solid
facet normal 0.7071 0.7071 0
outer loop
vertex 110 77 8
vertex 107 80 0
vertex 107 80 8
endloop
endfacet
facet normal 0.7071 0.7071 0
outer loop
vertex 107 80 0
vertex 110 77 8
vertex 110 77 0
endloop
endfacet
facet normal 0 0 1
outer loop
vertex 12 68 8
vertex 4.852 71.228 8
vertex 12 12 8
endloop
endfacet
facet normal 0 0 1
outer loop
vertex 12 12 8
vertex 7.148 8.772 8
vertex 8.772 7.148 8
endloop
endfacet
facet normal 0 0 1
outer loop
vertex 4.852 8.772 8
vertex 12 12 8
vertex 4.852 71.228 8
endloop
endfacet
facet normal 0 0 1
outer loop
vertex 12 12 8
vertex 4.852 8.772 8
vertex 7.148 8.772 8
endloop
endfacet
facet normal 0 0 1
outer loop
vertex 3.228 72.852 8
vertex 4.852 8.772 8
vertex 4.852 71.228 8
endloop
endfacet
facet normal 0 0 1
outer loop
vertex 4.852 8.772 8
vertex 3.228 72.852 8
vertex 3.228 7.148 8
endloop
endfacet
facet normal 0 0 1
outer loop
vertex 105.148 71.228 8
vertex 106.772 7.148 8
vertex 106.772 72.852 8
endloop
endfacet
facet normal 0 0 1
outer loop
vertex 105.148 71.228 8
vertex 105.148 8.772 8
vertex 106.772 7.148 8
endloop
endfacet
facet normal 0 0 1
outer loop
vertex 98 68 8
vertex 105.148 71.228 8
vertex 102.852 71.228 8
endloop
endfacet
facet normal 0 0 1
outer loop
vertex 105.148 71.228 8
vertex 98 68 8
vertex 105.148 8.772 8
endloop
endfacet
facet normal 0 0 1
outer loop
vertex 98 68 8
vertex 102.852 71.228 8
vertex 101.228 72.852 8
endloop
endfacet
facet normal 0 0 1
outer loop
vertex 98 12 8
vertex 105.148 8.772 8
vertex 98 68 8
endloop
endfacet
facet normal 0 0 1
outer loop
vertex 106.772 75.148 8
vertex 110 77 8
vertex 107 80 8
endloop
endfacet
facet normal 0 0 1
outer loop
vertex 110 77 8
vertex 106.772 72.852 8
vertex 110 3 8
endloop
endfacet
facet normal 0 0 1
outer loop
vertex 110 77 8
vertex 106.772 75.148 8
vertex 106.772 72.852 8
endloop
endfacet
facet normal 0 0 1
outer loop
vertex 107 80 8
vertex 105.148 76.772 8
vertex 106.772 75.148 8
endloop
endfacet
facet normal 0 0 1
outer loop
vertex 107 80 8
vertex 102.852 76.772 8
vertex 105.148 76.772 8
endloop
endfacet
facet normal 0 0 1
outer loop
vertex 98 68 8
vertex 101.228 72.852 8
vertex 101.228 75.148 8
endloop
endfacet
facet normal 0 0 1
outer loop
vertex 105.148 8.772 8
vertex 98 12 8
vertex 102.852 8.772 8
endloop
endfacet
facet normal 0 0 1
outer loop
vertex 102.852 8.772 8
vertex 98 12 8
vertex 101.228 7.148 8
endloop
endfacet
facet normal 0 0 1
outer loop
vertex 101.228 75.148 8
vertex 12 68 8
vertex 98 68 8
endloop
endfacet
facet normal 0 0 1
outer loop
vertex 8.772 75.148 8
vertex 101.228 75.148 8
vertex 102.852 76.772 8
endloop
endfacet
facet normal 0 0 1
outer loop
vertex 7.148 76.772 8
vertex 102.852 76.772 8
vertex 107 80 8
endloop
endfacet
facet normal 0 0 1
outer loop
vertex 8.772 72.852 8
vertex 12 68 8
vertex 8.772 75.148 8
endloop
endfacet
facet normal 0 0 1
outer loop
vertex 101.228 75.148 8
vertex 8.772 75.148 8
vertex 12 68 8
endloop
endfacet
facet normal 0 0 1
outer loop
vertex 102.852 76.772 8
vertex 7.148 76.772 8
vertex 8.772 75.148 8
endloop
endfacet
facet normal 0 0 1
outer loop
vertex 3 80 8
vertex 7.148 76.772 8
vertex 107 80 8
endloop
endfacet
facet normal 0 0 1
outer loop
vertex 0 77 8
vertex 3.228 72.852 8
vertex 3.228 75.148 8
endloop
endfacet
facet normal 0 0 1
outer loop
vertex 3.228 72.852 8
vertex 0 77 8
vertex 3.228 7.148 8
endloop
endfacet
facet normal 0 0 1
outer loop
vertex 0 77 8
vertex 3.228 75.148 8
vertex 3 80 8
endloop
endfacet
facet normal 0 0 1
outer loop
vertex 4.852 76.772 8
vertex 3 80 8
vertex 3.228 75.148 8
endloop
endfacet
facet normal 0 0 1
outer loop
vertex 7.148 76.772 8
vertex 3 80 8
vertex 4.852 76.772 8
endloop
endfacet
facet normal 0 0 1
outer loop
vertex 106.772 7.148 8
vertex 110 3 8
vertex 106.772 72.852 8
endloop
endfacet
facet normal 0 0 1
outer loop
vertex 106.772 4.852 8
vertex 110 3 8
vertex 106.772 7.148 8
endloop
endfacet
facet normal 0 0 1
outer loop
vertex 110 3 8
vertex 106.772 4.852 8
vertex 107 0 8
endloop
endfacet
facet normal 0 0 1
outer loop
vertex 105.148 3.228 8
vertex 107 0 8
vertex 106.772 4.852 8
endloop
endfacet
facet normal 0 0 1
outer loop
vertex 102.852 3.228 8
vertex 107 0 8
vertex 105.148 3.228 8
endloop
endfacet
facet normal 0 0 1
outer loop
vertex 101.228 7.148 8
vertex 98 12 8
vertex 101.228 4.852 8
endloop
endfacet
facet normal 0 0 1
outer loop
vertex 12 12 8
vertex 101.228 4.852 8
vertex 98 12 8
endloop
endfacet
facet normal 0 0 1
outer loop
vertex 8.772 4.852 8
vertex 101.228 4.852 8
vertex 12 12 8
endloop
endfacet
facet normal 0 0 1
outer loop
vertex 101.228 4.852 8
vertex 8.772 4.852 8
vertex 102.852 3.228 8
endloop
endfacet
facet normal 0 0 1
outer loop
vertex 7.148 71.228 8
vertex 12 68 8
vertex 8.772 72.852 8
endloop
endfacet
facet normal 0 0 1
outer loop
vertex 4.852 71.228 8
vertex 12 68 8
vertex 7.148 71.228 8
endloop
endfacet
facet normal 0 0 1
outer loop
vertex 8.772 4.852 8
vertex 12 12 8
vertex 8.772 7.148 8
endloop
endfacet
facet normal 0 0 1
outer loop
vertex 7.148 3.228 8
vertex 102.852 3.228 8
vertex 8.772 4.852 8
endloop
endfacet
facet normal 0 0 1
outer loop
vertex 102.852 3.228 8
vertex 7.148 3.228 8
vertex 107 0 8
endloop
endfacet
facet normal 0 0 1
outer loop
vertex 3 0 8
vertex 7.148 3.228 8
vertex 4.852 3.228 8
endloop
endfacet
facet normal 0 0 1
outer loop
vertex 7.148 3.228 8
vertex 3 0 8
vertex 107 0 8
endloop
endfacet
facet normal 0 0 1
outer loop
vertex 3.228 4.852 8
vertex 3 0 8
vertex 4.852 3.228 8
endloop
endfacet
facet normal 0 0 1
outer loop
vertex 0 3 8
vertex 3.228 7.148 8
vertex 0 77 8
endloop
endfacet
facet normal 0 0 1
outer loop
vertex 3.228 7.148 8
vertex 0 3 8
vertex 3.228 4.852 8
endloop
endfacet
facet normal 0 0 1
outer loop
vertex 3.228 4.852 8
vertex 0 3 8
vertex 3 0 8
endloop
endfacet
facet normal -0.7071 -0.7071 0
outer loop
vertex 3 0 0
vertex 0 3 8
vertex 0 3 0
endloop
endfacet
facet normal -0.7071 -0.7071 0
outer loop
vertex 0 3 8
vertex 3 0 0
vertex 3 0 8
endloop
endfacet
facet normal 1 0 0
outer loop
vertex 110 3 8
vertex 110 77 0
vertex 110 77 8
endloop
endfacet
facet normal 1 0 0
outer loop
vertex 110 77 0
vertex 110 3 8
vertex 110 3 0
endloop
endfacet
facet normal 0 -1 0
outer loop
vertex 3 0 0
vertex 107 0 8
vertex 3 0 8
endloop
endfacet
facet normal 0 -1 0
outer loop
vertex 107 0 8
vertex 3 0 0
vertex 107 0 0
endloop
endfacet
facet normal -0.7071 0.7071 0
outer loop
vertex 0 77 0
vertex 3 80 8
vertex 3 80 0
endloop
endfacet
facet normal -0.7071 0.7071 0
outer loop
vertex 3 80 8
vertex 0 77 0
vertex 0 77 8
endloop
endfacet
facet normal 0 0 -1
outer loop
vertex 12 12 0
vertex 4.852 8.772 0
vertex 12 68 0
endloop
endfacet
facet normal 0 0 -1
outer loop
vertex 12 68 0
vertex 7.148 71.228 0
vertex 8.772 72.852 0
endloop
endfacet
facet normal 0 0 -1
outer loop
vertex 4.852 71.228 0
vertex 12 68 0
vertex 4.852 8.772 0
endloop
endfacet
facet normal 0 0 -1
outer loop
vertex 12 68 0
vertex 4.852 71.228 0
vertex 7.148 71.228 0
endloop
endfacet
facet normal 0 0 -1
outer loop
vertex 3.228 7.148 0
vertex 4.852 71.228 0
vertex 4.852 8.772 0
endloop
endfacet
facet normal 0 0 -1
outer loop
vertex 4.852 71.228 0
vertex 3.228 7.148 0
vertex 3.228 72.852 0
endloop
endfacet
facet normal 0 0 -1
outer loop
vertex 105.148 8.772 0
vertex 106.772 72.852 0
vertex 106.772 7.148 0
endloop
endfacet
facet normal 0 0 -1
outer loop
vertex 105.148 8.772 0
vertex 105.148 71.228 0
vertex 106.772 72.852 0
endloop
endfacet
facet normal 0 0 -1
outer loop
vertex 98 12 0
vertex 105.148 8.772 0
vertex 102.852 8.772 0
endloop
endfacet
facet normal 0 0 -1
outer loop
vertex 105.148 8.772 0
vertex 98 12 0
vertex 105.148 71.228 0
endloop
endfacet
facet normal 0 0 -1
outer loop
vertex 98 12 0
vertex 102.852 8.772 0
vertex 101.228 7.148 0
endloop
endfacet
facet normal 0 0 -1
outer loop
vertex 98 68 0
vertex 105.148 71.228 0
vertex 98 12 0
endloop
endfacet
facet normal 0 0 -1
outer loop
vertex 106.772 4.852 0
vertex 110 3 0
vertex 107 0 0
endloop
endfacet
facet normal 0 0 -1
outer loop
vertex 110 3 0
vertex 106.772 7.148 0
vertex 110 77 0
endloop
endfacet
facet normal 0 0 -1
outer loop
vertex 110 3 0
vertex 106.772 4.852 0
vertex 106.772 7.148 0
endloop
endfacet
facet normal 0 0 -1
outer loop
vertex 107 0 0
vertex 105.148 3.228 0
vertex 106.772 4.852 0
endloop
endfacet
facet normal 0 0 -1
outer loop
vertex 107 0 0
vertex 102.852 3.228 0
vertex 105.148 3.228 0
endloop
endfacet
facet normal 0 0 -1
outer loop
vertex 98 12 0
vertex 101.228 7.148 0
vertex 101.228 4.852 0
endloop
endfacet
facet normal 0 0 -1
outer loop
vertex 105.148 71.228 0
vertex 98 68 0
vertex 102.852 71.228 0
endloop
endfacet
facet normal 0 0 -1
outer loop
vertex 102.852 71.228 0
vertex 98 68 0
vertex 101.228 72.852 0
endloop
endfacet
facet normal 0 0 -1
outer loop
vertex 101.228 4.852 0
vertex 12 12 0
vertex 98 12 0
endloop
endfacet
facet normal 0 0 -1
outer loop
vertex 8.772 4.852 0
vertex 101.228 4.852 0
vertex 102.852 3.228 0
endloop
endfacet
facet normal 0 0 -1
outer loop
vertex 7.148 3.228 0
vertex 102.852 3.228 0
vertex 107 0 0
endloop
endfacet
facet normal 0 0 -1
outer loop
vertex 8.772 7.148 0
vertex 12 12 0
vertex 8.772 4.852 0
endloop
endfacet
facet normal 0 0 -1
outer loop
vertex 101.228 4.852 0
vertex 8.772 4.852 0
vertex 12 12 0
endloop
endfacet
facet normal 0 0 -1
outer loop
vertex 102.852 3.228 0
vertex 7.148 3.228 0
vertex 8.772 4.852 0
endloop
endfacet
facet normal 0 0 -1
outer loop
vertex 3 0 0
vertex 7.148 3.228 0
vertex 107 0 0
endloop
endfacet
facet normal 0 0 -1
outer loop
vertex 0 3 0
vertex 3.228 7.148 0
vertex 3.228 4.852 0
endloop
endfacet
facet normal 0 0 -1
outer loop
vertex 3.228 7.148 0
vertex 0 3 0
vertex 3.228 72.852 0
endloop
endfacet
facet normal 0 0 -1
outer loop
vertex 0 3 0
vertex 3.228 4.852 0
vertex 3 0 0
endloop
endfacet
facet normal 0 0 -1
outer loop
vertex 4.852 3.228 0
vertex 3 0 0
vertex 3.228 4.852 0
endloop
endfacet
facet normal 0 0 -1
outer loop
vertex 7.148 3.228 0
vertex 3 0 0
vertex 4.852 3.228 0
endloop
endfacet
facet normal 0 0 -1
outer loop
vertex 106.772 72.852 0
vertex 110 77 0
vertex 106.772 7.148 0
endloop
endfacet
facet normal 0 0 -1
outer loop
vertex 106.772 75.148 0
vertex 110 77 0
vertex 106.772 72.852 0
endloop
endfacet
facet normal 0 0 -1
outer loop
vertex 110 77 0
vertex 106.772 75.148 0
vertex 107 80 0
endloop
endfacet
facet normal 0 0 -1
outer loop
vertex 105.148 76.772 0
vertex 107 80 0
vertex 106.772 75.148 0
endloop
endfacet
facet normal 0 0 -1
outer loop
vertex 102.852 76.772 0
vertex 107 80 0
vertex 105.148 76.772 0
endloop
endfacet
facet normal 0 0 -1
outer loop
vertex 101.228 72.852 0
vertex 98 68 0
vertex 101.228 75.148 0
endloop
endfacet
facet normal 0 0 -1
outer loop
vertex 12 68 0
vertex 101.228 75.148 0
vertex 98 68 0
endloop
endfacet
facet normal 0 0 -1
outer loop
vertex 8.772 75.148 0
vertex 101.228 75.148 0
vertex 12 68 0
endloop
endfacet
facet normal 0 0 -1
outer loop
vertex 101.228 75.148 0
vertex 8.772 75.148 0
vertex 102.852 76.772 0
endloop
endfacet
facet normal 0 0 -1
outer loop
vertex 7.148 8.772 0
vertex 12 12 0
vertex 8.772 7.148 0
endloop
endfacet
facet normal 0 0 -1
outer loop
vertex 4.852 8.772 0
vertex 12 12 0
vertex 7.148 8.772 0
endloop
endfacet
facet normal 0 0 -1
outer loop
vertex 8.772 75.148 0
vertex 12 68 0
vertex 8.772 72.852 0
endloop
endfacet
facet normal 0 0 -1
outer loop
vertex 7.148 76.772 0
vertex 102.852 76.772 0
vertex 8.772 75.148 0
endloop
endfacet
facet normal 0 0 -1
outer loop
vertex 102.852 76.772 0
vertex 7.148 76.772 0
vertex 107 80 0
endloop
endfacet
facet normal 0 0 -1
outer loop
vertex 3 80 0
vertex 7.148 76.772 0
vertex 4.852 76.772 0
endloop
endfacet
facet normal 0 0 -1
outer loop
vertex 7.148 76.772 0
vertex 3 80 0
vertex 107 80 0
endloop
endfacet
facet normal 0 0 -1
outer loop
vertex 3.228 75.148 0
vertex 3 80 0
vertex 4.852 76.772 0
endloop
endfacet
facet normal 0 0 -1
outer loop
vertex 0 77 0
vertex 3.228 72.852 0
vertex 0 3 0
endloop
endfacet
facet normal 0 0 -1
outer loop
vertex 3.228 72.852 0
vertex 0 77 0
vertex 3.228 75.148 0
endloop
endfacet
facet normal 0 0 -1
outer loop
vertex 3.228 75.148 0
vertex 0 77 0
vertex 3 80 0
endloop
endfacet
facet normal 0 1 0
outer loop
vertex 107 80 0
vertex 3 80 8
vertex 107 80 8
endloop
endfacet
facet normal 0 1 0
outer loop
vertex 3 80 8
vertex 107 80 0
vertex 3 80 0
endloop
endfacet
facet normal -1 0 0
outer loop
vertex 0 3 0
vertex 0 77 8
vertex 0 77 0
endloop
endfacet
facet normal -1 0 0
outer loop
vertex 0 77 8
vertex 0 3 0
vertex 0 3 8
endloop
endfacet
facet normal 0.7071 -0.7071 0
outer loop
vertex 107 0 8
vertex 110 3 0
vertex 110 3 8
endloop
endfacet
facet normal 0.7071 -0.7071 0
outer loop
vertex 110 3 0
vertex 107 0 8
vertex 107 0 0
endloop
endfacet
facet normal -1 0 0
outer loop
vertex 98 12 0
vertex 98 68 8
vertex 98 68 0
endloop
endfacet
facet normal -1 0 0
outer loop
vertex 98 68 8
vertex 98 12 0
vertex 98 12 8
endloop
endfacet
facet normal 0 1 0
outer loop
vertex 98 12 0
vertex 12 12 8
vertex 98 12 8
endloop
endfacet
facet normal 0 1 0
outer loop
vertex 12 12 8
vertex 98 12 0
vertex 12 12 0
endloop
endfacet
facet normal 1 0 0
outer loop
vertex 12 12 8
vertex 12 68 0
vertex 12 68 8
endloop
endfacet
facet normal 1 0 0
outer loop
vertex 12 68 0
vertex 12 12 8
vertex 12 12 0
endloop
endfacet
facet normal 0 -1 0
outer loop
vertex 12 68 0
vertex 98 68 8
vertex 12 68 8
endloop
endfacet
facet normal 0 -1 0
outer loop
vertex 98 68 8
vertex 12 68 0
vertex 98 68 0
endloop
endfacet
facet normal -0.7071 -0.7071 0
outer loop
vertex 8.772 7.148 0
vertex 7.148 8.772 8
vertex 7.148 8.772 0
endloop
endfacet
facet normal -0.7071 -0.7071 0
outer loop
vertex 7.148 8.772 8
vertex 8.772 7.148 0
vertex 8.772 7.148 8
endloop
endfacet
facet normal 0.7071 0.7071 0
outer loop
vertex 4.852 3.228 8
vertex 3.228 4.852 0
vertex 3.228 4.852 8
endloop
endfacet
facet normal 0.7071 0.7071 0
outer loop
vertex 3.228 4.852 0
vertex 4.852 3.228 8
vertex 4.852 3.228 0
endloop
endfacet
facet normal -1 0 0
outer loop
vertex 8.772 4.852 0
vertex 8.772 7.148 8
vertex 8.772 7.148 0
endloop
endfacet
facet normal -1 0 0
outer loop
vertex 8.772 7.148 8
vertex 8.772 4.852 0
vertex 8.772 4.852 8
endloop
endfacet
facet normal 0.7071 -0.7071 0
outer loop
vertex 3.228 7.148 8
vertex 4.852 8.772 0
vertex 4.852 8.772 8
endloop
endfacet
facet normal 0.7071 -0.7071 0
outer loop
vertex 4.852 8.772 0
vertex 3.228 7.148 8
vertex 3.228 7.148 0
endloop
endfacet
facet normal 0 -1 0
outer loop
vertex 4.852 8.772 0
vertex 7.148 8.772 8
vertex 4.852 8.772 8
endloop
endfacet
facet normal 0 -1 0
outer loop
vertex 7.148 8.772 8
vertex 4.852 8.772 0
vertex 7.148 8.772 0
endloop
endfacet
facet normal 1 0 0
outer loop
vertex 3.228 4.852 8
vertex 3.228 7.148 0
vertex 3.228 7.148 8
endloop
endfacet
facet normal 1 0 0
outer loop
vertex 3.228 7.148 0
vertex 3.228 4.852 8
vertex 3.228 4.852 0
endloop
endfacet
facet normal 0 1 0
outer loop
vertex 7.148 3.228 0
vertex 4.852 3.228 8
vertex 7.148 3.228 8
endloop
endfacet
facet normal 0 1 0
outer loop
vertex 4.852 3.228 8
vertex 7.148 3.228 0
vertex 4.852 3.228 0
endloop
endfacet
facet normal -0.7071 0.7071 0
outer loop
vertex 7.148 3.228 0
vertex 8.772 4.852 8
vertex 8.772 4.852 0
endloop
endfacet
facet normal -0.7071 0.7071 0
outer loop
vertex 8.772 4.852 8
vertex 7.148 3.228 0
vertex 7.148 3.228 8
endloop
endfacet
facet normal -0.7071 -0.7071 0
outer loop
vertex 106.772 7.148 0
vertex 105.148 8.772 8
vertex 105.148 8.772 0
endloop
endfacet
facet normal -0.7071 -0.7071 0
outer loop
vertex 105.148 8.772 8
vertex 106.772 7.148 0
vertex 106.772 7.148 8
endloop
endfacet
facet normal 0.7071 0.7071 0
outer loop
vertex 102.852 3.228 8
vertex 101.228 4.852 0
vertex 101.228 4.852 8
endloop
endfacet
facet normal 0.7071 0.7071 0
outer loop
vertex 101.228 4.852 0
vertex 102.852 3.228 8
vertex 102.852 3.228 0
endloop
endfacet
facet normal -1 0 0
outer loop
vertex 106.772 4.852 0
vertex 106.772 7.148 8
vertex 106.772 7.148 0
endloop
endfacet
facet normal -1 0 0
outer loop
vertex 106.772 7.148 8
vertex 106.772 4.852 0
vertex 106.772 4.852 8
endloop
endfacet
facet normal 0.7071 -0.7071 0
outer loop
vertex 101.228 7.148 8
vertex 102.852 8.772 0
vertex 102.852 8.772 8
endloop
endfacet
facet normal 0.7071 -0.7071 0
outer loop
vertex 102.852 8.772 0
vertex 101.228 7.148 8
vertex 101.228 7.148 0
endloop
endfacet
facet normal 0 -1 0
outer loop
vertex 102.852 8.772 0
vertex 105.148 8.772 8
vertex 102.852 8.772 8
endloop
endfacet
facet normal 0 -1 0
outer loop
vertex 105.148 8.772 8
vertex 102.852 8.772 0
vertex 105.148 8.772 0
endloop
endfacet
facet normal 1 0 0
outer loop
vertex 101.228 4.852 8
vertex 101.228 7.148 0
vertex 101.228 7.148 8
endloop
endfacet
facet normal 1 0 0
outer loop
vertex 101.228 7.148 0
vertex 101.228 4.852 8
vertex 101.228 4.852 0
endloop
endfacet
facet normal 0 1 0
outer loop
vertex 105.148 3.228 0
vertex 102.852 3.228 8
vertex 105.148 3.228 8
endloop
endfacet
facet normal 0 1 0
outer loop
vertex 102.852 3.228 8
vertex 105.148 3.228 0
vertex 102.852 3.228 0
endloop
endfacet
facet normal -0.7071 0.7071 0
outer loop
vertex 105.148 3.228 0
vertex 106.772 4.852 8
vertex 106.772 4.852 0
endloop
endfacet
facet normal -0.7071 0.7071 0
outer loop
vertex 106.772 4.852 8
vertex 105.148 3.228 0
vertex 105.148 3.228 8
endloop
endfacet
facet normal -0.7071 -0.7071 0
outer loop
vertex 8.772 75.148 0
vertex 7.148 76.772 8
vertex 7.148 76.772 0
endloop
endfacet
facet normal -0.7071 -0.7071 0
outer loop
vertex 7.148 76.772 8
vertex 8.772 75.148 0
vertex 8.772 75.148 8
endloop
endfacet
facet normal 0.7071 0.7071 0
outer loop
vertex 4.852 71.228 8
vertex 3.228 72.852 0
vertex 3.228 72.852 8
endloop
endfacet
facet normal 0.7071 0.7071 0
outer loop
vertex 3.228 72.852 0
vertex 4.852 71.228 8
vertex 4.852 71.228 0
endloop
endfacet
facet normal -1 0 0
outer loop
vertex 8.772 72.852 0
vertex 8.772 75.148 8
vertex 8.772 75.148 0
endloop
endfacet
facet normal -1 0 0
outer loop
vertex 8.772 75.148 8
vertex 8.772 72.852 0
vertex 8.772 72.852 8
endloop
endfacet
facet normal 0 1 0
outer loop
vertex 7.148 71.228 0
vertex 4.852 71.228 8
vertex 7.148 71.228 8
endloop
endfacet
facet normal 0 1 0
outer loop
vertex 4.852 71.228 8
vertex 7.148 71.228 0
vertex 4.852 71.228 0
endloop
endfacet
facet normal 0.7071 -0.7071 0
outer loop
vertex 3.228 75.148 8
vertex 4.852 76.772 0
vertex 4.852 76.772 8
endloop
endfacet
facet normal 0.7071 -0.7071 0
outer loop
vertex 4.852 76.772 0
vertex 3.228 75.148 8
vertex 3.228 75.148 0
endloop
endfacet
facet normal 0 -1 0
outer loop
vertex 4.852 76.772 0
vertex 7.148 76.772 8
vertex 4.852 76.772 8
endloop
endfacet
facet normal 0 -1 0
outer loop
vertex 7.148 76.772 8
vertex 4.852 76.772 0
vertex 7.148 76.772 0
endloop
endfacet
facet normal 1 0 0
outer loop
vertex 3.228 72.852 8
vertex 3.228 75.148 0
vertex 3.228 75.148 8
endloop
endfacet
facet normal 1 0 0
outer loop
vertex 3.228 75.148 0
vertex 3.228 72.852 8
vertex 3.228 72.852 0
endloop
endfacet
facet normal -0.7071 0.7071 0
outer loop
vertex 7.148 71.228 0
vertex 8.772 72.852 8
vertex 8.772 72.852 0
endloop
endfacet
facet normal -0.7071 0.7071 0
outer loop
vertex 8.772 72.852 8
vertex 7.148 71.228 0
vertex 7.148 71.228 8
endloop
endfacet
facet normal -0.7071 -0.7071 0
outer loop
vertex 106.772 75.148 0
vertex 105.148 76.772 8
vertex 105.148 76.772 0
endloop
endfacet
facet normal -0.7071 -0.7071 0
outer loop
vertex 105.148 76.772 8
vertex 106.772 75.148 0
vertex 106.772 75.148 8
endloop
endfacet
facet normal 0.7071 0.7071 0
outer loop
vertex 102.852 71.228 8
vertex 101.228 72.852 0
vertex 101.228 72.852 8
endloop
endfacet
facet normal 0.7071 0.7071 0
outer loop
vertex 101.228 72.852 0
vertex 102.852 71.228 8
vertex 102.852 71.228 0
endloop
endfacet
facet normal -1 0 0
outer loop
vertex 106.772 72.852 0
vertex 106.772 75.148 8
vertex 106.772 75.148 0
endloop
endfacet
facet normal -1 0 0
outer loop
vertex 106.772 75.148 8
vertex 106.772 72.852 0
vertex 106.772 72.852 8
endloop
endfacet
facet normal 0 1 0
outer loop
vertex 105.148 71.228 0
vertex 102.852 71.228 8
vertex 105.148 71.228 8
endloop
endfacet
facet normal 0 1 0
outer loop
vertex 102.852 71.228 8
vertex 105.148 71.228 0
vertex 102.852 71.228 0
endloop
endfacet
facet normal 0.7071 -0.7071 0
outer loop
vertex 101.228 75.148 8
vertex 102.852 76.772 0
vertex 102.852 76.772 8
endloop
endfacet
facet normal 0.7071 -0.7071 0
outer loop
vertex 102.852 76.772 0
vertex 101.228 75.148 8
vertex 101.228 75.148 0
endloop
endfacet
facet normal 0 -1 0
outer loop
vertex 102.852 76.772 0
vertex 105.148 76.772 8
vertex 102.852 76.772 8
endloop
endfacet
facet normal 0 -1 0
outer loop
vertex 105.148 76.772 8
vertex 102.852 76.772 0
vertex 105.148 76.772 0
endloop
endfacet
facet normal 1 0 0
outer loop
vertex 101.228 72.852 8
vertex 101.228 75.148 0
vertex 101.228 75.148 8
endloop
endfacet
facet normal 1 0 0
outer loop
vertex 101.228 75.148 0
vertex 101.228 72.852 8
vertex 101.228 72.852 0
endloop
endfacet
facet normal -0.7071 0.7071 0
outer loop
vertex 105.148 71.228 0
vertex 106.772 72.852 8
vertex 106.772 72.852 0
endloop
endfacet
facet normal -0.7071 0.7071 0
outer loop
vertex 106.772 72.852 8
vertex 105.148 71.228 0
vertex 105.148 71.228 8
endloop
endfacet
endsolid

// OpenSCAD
$fn = 32;

// ----------------------------------------------------------------------
// Frame plate: 110 x 80 frame, 12 mm rails
// ----------------------------------------------------------------------

// --- parameters (mm) ---
plate_l = 110;            // plate length, X
plate_w = 80;             // plate width, Y
plate_t = 8;              // plate thickness, Z (extrusion height)
corner_c = 3;             // corner chamfer
frame_bar = 12;           // frame rail width
bolt_r = 3;               // corner bolt window radius
bolt_inset = 6;           // bolt centre inset from the edges

win_l = plate_l - 2 * frame_bar;  // window length
win_w = plate_w - 2 * frame_bar;  // window width
bolt_d = 2 * bolt_r;  // corner hole diameter

profile = [[3, 0], [107, 0], [110, 3], [110, 77], [107, 80], [3, 80], [0, 77], [0, 3]];  // primary outline, 8 points, counter clockwise
void_1 = [[12, 12], [98, 12], [98, 68], [12, 68]];  // the window, 4 points
void_2 = [[8.772, 7.148], [7.148, 8.772], [4.852, 8.772], [3.228, 7.148], [3.228, 4.852], [4.852, 3.228], [7.148, 3.228], [8.772, 4.852]];  // corner bolt window, 8 points
void_3 = [[106.772, 7.148], [105.148, 8.772], [102.852, 8.772], [101.228, 7.148], [101.228, 4.852], [102.852, 3.228], [105.148, 3.228], [106.772, 4.852]];  // corner bolt window, 8 points
void_4 = [[8.772, 75.148], [7.148, 76.772], [4.852, 76.772], [3.228, 75.148], [3.228, 72.852], [4.852, 71.228], [7.148, 71.228], [8.772, 72.852]];  // corner bolt window, 8 points
void_5 = [[106.772, 75.148], [105.148, 76.772], [102.852, 76.772], [101.228, 75.148], [101.228, 72.852], [102.852, 71.228], [105.148, 71.228], [106.772, 72.852]];  // corner bolt window, 8 points

// --- the one profile operation ---
difference() {
  linear_extrude(height = plate_t) polygon(points = profile);
  translate([0, 0, -1])
    linear_extrude(height = plate_t + 2) polygon(points = void_1);
  translate([0, 0, -1])
    linear_extrude(height = plate_t + 2) polygon(points = void_2);
  translate([0, 0, -1])
    linear_extrude(height = plate_t + 2) polygon(points = void_3);
  translate([0, 0, -1])
    linear_extrude(height = plate_t + 2) polygon(points = void_4);
  translate([0, 0, -1])
    linear_extrude(height = plate_t + 2) polygon(points = void_5);
}
